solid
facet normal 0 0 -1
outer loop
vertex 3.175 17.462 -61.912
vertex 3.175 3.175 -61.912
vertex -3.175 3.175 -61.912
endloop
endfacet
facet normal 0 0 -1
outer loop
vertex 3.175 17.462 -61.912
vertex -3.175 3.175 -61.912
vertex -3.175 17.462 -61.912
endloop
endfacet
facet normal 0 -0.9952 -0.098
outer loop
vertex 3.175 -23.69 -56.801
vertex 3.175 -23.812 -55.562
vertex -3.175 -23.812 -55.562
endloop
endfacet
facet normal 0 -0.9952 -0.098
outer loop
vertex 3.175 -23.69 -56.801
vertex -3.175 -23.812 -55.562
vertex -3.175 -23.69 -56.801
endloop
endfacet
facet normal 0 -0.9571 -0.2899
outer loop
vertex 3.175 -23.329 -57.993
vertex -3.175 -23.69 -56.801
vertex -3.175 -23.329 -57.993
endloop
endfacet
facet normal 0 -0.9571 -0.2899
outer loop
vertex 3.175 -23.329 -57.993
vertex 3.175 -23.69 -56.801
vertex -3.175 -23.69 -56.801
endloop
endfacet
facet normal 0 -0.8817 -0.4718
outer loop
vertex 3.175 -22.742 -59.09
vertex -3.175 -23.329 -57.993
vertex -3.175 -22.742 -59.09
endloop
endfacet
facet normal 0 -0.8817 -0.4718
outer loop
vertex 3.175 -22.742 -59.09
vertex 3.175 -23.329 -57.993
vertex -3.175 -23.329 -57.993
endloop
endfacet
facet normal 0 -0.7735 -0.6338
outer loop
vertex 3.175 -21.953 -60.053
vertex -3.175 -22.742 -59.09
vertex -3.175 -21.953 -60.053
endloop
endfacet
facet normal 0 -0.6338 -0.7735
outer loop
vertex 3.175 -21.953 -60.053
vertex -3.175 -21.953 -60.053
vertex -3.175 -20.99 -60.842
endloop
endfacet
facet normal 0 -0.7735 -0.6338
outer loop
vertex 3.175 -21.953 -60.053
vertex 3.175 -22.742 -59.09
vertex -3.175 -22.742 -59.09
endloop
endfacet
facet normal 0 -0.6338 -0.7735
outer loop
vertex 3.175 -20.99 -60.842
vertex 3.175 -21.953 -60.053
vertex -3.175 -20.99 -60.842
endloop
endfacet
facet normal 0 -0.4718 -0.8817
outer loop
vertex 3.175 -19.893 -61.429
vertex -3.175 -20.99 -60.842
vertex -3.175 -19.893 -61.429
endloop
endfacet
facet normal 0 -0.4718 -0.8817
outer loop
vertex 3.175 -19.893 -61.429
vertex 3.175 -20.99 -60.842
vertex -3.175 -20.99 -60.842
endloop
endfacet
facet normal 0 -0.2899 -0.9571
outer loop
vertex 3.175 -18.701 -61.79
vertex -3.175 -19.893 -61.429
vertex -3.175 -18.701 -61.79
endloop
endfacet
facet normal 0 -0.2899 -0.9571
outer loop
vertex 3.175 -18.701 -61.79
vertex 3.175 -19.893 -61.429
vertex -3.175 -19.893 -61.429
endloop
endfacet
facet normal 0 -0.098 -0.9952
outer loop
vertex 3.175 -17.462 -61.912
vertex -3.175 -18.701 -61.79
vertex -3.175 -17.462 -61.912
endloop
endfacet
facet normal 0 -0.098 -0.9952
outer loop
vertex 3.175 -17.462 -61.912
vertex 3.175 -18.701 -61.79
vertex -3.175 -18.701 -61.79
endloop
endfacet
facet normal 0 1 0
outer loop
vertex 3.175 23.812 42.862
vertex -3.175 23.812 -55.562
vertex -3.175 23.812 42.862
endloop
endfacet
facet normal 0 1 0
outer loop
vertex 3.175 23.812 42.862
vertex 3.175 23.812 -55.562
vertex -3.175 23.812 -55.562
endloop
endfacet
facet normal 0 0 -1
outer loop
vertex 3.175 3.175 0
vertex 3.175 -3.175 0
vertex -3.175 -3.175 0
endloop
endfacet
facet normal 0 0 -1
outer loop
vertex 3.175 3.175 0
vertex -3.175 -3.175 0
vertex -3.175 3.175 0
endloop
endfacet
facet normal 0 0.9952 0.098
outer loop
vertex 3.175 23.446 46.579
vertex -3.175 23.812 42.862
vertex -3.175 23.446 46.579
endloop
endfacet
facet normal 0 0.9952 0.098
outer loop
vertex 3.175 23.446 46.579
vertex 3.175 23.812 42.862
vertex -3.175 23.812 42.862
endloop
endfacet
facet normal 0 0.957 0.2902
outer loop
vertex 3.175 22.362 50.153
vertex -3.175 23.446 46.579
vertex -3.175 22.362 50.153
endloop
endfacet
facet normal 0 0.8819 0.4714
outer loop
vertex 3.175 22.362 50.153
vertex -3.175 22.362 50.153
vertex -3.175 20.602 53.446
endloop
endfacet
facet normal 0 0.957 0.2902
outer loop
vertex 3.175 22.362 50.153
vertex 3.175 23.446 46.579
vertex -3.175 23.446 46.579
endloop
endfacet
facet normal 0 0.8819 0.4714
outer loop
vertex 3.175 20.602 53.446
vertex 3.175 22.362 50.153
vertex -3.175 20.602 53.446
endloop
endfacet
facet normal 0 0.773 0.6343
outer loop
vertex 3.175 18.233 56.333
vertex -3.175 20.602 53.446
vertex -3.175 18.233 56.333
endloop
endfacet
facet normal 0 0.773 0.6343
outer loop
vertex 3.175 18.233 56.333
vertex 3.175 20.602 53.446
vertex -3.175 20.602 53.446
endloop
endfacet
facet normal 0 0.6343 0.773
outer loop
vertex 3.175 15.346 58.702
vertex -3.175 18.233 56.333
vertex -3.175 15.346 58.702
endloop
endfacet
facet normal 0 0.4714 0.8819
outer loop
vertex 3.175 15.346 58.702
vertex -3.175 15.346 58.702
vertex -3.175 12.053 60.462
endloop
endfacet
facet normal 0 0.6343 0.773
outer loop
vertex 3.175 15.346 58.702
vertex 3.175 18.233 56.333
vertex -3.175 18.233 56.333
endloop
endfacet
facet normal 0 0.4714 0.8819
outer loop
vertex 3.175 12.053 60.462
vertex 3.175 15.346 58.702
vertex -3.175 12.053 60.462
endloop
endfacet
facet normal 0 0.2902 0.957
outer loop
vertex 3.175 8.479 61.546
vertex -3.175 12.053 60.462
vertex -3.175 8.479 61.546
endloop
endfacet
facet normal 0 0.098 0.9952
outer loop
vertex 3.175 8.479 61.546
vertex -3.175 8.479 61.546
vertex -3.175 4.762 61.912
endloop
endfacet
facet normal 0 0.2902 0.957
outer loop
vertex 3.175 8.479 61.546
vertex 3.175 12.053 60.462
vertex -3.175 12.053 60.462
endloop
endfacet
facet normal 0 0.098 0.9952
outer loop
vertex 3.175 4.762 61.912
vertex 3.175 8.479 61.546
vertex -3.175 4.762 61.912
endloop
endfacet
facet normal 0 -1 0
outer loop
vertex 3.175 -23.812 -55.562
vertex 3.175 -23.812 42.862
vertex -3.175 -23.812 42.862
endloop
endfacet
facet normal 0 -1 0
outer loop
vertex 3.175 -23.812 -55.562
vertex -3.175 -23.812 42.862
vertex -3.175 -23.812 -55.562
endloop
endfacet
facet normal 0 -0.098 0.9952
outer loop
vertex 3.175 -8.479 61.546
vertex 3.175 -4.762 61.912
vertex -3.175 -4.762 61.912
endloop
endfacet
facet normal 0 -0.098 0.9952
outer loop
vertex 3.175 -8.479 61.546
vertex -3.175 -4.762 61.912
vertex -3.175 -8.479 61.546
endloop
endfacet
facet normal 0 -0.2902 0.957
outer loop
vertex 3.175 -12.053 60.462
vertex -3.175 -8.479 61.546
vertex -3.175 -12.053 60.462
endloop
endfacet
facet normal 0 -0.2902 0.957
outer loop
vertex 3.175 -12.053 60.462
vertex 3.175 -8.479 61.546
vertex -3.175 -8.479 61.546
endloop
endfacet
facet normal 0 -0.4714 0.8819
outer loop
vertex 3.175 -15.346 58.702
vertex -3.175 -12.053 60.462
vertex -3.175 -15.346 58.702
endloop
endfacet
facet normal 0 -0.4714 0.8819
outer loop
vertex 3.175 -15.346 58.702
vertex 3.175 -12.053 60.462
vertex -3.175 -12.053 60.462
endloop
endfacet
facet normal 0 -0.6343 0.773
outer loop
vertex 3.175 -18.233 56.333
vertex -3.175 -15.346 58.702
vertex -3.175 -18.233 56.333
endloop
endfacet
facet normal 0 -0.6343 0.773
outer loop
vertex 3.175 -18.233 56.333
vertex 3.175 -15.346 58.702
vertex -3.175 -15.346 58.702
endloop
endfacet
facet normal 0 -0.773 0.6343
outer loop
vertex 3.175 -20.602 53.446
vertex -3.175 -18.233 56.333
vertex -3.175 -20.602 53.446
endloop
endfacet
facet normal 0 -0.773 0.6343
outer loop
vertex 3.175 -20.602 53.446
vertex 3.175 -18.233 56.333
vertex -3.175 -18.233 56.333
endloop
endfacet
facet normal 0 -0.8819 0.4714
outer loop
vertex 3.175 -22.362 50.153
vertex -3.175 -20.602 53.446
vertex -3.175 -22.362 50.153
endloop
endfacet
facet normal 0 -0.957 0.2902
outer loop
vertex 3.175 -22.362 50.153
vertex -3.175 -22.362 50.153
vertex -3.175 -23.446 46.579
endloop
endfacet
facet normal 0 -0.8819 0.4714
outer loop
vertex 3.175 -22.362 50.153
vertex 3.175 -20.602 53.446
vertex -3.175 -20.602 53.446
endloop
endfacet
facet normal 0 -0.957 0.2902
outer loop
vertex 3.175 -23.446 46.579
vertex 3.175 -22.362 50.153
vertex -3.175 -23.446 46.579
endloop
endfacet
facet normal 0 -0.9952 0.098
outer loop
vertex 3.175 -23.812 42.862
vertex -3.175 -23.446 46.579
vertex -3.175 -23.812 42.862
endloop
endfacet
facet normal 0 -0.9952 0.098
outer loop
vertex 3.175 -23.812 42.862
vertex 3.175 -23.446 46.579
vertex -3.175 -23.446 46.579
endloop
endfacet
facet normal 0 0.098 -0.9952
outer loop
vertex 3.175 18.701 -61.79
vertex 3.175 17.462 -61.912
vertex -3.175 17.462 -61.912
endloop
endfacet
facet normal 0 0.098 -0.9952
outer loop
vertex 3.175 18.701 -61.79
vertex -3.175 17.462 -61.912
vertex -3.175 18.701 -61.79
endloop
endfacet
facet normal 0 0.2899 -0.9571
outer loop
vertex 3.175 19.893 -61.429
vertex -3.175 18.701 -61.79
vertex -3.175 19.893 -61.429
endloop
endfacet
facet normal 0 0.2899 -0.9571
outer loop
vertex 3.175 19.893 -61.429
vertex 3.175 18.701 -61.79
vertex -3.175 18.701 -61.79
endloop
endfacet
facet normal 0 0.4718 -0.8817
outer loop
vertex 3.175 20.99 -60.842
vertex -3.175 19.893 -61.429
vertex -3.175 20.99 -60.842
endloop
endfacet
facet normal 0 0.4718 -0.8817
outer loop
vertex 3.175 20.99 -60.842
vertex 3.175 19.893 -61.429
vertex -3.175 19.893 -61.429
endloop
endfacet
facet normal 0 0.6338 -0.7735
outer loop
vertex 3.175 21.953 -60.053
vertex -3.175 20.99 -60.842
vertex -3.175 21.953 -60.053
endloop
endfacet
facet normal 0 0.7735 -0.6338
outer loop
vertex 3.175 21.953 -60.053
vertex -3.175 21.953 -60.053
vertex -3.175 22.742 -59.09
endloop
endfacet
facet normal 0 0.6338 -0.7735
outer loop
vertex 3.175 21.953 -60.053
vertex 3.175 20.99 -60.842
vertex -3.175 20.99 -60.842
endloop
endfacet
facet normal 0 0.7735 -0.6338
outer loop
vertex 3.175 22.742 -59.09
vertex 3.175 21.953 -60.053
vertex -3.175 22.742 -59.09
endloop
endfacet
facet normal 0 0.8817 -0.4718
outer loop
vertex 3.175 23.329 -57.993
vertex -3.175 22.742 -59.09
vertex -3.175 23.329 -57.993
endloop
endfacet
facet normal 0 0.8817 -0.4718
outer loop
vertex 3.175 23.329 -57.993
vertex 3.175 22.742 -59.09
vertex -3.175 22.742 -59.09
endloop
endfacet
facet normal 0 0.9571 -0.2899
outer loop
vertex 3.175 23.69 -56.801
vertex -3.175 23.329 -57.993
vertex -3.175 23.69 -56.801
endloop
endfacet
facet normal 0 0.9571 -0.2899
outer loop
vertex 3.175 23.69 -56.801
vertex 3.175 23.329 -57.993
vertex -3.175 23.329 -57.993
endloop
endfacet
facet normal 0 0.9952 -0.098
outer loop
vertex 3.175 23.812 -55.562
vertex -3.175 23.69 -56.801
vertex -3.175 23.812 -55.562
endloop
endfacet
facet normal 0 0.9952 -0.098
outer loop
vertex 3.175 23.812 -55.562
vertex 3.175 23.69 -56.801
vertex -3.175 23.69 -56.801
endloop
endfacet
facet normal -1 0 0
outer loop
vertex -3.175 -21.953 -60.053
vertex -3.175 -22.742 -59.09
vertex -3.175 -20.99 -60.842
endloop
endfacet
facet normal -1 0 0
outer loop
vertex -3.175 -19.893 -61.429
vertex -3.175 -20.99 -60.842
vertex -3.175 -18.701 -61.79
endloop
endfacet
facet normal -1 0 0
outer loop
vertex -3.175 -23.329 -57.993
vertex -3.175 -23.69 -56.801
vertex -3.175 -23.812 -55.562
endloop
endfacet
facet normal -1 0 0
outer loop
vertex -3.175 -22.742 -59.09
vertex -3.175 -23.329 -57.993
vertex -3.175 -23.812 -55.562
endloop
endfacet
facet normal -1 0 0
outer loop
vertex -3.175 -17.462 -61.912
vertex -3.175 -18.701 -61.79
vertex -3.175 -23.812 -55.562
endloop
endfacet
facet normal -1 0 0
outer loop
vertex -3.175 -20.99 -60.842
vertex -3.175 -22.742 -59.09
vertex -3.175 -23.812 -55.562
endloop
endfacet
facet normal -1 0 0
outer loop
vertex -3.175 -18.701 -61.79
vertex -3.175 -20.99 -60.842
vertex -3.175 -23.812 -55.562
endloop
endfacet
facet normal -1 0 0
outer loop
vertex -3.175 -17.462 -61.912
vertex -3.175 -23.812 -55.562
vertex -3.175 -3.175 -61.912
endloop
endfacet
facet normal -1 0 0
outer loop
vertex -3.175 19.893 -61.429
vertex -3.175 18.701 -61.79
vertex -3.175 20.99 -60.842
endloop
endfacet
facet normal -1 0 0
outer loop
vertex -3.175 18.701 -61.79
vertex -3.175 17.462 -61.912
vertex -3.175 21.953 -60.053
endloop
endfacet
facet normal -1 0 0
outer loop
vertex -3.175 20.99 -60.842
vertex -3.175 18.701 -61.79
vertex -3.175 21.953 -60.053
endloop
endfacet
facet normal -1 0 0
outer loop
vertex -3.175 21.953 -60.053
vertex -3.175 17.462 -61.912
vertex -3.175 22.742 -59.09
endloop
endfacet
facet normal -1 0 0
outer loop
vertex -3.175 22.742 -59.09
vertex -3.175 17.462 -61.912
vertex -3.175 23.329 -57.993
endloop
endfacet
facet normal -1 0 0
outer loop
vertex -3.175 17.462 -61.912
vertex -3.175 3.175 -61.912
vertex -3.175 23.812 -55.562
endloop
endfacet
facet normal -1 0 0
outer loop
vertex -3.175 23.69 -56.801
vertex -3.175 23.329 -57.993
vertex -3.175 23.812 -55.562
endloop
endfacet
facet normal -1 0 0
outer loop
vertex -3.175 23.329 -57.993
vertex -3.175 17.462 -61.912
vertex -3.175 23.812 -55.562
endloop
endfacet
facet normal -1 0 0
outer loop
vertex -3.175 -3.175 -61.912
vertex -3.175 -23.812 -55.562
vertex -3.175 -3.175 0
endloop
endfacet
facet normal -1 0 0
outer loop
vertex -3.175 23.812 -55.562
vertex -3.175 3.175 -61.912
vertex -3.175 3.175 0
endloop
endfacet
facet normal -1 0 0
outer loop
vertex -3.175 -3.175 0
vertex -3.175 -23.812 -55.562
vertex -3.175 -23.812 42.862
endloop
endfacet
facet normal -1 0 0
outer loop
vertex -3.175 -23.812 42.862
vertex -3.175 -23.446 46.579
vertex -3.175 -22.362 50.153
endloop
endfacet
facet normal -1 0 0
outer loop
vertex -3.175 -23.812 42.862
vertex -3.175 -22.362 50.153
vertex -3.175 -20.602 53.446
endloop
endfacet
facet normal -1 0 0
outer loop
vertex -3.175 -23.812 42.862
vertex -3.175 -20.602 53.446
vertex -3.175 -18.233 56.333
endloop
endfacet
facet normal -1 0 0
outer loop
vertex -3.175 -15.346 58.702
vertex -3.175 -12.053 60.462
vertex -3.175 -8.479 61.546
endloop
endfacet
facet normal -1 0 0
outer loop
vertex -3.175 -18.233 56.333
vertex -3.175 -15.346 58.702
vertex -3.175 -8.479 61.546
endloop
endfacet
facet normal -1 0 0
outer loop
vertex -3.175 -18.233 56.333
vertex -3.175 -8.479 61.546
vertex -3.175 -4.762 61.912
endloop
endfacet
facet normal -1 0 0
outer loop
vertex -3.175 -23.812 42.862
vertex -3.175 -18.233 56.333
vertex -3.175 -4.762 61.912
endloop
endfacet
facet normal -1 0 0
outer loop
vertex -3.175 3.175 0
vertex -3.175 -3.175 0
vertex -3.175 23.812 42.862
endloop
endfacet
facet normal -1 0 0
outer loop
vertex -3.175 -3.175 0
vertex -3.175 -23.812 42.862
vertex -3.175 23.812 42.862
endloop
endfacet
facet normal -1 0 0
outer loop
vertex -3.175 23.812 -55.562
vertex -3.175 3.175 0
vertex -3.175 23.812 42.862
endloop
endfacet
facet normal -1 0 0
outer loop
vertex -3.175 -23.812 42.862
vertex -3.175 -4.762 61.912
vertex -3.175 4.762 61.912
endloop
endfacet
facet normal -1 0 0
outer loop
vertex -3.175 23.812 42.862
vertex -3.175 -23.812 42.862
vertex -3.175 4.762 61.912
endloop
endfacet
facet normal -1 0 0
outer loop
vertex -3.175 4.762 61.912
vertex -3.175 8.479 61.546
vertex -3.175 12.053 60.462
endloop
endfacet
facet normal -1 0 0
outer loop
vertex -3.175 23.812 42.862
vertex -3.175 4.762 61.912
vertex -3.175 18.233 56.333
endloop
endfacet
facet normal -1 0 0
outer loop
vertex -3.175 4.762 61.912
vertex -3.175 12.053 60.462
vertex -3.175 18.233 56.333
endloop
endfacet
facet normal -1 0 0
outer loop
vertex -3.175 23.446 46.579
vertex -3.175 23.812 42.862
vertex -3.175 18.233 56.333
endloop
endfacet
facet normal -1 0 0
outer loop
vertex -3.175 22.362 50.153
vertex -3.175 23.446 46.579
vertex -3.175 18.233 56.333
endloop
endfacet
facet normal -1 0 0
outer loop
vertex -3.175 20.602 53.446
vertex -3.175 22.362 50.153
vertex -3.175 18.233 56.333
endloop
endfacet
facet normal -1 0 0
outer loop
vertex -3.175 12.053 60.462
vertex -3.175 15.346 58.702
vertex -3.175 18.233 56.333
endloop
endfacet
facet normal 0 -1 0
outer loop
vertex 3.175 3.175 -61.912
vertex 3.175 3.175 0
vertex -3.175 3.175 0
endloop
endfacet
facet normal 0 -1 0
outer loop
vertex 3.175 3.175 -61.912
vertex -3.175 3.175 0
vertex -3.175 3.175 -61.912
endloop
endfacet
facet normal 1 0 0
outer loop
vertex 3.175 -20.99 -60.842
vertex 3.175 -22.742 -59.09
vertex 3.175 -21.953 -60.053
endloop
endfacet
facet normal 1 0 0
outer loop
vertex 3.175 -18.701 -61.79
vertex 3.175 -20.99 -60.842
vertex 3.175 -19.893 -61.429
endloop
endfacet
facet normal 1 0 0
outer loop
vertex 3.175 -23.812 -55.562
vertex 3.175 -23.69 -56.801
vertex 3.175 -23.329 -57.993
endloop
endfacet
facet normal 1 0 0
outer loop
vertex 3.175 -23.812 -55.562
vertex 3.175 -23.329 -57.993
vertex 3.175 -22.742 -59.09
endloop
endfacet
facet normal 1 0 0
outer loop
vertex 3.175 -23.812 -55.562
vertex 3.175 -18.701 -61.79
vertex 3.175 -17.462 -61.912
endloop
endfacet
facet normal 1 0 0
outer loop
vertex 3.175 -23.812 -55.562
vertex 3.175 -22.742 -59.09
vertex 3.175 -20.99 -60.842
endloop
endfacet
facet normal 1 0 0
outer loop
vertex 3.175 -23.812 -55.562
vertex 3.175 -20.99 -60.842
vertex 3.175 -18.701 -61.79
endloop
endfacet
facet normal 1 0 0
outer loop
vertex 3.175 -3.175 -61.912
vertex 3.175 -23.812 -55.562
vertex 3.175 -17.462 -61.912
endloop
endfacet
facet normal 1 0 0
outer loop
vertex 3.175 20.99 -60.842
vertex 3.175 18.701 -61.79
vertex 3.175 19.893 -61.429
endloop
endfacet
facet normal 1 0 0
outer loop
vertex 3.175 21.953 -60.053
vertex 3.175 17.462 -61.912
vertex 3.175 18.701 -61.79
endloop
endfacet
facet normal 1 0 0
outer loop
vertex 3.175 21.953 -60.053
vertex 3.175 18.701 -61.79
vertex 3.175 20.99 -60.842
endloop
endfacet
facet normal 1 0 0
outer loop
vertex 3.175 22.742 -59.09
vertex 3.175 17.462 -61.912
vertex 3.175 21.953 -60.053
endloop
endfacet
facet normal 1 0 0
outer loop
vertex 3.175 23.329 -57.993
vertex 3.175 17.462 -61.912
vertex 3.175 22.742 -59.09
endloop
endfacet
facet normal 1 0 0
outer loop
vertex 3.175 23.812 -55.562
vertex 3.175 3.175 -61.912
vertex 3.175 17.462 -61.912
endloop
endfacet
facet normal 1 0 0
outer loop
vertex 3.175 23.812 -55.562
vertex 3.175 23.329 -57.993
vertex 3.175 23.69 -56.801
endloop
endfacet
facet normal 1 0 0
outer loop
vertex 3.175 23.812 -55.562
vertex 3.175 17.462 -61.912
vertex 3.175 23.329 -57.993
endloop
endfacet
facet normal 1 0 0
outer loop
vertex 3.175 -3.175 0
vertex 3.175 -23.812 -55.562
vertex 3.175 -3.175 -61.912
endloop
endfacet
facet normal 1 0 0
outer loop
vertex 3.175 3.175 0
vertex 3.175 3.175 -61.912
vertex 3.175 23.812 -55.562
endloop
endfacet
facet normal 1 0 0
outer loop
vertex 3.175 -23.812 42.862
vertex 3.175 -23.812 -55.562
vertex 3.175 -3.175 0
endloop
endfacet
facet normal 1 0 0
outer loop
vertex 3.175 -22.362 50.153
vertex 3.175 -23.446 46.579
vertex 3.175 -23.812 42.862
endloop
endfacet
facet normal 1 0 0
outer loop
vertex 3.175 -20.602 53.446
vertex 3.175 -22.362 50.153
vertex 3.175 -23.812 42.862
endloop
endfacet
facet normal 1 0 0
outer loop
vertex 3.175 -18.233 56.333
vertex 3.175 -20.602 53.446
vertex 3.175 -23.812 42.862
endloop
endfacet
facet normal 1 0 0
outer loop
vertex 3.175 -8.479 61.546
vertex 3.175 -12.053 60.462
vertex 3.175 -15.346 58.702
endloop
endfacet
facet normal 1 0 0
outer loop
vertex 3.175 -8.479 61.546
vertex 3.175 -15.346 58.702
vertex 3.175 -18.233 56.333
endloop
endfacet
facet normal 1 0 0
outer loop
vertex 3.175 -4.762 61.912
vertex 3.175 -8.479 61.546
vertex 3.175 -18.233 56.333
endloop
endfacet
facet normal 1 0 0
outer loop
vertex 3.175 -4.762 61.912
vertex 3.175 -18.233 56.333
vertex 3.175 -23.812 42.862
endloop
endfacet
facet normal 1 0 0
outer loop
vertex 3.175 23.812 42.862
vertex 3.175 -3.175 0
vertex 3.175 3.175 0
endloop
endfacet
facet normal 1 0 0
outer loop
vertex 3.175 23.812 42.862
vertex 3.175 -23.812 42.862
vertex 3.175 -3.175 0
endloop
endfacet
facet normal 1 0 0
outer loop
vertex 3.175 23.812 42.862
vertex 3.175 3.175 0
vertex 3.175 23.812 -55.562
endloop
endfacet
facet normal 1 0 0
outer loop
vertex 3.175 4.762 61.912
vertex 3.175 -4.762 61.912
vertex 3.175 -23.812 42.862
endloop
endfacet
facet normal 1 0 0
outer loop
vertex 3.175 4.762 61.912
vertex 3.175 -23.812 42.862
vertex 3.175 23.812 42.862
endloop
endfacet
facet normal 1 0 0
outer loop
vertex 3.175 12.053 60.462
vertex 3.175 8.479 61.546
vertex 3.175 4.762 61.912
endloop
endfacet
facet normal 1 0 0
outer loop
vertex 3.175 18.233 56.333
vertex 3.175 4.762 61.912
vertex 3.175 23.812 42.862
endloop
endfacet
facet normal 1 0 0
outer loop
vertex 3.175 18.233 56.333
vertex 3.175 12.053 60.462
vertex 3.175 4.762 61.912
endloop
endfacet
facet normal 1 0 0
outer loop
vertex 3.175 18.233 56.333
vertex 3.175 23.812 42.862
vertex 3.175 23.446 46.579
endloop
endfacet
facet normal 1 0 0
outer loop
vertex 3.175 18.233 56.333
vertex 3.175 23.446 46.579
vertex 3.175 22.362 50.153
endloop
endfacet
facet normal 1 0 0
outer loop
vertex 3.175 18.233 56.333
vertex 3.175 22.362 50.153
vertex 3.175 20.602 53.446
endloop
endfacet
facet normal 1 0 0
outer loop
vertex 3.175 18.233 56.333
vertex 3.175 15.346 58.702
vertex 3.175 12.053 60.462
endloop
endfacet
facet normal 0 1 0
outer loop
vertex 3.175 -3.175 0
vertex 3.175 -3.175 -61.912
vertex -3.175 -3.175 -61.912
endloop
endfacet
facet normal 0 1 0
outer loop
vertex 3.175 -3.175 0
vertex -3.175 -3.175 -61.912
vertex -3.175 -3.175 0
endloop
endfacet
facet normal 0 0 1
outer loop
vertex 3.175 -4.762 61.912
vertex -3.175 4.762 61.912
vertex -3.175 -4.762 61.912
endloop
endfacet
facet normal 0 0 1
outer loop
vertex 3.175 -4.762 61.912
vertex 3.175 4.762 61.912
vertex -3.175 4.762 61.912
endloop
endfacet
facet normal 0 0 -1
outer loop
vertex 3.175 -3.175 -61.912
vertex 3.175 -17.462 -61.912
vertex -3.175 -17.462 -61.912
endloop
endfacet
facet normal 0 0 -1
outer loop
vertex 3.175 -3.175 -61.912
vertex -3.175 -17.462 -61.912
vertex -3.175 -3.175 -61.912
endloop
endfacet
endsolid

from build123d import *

# Parameters (mm, degrees)
F1_DEPTH = 3.175


with BuildPart() as f1:
    # F0 (on Right) → F1 (new body, symmetric)
    with BuildSketch(Plane.YZ):
        with BuildLine():
            Line((4.7625, 61.9125), (-4.7625, 61.9125))
            ThreePointArc((-4.7625, 61.9125), (-18.232884, 56.332884), (-23.8125, 42.8625))
            Line((-23.8125, 42.8625), (-23.8125, -55.5625))
            ThreePointArc((-23.8125, -55.5625), (-21.952628, -60.052628), (-17.4625, -61.9125))
            Line((-17.4625, -61.9125), (-3.175, -61.9125))
            Line((-3.175, -61.9125), (-3.175, 0))
            Line((-3.175, 0), (3.175, 0))
            Line((3.175, 0), (3.175, -61.9125))
            Line((3.175, -61.9125), (17.4625, -61.9125))
            ThreePointArc((17.4625, -61.9125), (21.952628, -60.052628), (23.8125, -55.5625))
            Line((23.8125, -55.5625), (23.8125, 42.8625))
            ThreePointArc((23.8125, 42.8625), (18.232884, 56.332884), (4.7625, 61.9125))
        make_face()
    extrude(amount=F1_DEPTH, both=True)


solid = f1.part
